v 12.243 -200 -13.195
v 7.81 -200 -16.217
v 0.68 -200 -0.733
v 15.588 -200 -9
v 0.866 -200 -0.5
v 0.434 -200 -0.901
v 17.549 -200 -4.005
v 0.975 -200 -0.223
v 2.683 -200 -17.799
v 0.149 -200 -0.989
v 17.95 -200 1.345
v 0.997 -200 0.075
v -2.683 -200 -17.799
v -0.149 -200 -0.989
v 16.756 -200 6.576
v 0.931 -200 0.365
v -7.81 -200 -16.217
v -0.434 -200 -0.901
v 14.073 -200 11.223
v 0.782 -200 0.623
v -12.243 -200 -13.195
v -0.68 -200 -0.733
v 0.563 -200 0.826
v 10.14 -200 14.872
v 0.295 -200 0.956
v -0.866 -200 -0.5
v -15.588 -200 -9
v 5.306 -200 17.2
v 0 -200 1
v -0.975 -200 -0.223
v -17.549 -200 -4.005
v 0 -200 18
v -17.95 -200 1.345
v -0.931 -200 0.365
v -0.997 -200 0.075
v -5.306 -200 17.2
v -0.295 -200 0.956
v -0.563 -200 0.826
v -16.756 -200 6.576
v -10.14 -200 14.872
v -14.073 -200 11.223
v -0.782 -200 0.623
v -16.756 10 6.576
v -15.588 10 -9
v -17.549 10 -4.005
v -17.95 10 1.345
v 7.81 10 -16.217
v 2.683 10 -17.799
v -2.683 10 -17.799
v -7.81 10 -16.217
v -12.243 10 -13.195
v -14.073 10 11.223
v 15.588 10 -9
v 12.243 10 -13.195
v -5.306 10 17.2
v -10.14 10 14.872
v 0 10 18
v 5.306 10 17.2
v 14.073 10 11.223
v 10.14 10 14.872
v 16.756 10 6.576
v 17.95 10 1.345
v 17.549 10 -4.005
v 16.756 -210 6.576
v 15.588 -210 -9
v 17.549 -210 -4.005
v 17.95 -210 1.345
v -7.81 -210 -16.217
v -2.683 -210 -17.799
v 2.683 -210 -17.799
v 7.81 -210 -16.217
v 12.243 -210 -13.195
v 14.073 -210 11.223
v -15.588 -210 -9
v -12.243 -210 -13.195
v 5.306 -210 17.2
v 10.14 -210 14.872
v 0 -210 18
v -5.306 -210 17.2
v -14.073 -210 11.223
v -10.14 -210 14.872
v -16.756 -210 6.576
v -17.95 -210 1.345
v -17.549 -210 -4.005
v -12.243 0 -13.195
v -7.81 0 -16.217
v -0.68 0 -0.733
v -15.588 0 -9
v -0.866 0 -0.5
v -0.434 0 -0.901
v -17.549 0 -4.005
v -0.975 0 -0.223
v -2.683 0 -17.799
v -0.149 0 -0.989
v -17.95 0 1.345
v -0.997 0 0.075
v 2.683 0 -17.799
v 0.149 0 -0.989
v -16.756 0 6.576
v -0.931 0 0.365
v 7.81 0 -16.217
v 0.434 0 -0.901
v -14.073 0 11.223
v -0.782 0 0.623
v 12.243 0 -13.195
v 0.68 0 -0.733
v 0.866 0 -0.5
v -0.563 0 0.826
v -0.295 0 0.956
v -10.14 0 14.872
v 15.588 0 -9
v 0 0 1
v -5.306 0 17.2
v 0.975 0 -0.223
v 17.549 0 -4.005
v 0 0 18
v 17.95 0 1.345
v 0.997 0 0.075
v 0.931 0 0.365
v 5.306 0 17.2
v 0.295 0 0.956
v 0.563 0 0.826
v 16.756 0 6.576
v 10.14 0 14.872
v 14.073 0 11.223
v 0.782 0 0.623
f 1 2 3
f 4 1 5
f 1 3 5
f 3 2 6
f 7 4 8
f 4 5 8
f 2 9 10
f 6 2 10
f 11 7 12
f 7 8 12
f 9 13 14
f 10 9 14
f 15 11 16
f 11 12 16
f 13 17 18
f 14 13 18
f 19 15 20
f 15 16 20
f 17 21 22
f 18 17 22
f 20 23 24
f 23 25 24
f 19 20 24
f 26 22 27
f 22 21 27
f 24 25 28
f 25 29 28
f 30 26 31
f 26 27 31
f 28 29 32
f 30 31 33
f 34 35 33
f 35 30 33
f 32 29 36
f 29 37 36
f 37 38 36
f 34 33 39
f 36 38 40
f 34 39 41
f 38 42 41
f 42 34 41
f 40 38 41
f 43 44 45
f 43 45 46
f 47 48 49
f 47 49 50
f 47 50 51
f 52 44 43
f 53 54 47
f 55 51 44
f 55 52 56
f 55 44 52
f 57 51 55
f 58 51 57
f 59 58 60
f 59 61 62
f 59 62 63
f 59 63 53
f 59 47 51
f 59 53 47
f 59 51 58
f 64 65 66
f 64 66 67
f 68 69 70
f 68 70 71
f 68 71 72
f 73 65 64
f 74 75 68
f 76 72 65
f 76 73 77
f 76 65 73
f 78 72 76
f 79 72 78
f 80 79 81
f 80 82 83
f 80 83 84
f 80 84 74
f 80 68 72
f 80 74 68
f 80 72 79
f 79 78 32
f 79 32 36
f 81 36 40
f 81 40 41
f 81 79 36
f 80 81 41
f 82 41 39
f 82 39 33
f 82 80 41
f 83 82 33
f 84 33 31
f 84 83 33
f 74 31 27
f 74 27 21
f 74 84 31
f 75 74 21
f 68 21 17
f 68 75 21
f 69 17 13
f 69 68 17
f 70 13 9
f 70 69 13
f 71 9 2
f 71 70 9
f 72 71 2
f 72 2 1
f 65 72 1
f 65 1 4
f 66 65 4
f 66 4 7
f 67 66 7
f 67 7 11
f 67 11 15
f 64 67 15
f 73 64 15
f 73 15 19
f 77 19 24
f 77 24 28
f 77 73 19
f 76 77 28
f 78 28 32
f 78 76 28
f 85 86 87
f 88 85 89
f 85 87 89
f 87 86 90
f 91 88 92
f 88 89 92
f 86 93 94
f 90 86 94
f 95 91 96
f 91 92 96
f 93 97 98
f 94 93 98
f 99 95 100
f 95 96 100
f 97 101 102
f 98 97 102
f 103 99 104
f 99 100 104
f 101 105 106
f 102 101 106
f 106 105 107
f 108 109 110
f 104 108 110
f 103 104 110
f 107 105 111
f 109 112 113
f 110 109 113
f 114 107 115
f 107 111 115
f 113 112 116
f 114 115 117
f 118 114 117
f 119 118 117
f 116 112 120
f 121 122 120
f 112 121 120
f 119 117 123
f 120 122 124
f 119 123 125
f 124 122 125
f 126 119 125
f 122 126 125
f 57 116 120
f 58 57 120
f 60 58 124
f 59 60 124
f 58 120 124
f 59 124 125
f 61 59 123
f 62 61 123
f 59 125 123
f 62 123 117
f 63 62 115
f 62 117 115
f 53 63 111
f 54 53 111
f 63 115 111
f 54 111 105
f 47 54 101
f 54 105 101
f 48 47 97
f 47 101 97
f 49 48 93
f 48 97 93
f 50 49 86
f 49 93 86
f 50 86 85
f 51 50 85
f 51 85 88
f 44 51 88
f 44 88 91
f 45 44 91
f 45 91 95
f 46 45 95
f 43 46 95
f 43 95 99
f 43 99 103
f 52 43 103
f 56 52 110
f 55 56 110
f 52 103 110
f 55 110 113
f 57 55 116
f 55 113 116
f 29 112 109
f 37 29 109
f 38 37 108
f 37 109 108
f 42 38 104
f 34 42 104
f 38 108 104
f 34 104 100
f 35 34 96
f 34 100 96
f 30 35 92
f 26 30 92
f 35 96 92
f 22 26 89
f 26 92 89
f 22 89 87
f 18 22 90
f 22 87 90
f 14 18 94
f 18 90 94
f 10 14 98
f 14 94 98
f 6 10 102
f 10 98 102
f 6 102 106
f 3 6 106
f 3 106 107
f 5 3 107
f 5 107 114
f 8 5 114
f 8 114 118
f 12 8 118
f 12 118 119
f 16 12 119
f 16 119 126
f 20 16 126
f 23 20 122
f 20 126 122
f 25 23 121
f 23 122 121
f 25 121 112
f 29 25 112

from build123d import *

# Parameters (mm, degrees)
SKETCH_1_R      = 18
EXTRUDE_1_DEPTH = 10
SKETCH_2_R      = 1
EXTRUDE_2_DEPTH = 200
EXTRUDE_START   = 10
SKETCH_3_R      = 18
EXTRUDE_3_DEPTH = 10


with BuildPart() as part:
    # 草图1 → 凸台-拉伸1 (new body)
    with BuildSketch(Plane(origin=(0, 0, 0), x_dir=(1, 0, 0), z_dir=(0, 1, 0))):
        with Locations(Location((0, 0, 0), (0, 0, 270))):
            Circle(SKETCH_1_R)
    extrude(amount=EXTRUDE_1_DEPTH)

    # 草图2 → 凸台-拉伸2 (add)
    with BuildSketch(Plane(origin=(0, 0, 0), x_dir=(-1, 0, 0), z_dir=(0, -1, 0))):
        with Locations(Location((0, 0, 0), (0, 0, 270))):
            Circle(SKETCH_2_R)
    extrude(amount=EXTRUDE_2_DEPTH)

    # 草图3 → 凸台-拉伸3 (add)
    with BuildSketch(Plane(origin=(0, -200, 0), x_dir=(-1, 0, 0), z_dir=(0, -1, 0)).offset(EXTRUDE_START)):
        with Locations(Location((0, 0, 0), (0, 0, 270))):
            Circle(SKETCH_3_R)
    extrude(amount=-EXTRUDE_3_DEPTH)


solid = part.part
